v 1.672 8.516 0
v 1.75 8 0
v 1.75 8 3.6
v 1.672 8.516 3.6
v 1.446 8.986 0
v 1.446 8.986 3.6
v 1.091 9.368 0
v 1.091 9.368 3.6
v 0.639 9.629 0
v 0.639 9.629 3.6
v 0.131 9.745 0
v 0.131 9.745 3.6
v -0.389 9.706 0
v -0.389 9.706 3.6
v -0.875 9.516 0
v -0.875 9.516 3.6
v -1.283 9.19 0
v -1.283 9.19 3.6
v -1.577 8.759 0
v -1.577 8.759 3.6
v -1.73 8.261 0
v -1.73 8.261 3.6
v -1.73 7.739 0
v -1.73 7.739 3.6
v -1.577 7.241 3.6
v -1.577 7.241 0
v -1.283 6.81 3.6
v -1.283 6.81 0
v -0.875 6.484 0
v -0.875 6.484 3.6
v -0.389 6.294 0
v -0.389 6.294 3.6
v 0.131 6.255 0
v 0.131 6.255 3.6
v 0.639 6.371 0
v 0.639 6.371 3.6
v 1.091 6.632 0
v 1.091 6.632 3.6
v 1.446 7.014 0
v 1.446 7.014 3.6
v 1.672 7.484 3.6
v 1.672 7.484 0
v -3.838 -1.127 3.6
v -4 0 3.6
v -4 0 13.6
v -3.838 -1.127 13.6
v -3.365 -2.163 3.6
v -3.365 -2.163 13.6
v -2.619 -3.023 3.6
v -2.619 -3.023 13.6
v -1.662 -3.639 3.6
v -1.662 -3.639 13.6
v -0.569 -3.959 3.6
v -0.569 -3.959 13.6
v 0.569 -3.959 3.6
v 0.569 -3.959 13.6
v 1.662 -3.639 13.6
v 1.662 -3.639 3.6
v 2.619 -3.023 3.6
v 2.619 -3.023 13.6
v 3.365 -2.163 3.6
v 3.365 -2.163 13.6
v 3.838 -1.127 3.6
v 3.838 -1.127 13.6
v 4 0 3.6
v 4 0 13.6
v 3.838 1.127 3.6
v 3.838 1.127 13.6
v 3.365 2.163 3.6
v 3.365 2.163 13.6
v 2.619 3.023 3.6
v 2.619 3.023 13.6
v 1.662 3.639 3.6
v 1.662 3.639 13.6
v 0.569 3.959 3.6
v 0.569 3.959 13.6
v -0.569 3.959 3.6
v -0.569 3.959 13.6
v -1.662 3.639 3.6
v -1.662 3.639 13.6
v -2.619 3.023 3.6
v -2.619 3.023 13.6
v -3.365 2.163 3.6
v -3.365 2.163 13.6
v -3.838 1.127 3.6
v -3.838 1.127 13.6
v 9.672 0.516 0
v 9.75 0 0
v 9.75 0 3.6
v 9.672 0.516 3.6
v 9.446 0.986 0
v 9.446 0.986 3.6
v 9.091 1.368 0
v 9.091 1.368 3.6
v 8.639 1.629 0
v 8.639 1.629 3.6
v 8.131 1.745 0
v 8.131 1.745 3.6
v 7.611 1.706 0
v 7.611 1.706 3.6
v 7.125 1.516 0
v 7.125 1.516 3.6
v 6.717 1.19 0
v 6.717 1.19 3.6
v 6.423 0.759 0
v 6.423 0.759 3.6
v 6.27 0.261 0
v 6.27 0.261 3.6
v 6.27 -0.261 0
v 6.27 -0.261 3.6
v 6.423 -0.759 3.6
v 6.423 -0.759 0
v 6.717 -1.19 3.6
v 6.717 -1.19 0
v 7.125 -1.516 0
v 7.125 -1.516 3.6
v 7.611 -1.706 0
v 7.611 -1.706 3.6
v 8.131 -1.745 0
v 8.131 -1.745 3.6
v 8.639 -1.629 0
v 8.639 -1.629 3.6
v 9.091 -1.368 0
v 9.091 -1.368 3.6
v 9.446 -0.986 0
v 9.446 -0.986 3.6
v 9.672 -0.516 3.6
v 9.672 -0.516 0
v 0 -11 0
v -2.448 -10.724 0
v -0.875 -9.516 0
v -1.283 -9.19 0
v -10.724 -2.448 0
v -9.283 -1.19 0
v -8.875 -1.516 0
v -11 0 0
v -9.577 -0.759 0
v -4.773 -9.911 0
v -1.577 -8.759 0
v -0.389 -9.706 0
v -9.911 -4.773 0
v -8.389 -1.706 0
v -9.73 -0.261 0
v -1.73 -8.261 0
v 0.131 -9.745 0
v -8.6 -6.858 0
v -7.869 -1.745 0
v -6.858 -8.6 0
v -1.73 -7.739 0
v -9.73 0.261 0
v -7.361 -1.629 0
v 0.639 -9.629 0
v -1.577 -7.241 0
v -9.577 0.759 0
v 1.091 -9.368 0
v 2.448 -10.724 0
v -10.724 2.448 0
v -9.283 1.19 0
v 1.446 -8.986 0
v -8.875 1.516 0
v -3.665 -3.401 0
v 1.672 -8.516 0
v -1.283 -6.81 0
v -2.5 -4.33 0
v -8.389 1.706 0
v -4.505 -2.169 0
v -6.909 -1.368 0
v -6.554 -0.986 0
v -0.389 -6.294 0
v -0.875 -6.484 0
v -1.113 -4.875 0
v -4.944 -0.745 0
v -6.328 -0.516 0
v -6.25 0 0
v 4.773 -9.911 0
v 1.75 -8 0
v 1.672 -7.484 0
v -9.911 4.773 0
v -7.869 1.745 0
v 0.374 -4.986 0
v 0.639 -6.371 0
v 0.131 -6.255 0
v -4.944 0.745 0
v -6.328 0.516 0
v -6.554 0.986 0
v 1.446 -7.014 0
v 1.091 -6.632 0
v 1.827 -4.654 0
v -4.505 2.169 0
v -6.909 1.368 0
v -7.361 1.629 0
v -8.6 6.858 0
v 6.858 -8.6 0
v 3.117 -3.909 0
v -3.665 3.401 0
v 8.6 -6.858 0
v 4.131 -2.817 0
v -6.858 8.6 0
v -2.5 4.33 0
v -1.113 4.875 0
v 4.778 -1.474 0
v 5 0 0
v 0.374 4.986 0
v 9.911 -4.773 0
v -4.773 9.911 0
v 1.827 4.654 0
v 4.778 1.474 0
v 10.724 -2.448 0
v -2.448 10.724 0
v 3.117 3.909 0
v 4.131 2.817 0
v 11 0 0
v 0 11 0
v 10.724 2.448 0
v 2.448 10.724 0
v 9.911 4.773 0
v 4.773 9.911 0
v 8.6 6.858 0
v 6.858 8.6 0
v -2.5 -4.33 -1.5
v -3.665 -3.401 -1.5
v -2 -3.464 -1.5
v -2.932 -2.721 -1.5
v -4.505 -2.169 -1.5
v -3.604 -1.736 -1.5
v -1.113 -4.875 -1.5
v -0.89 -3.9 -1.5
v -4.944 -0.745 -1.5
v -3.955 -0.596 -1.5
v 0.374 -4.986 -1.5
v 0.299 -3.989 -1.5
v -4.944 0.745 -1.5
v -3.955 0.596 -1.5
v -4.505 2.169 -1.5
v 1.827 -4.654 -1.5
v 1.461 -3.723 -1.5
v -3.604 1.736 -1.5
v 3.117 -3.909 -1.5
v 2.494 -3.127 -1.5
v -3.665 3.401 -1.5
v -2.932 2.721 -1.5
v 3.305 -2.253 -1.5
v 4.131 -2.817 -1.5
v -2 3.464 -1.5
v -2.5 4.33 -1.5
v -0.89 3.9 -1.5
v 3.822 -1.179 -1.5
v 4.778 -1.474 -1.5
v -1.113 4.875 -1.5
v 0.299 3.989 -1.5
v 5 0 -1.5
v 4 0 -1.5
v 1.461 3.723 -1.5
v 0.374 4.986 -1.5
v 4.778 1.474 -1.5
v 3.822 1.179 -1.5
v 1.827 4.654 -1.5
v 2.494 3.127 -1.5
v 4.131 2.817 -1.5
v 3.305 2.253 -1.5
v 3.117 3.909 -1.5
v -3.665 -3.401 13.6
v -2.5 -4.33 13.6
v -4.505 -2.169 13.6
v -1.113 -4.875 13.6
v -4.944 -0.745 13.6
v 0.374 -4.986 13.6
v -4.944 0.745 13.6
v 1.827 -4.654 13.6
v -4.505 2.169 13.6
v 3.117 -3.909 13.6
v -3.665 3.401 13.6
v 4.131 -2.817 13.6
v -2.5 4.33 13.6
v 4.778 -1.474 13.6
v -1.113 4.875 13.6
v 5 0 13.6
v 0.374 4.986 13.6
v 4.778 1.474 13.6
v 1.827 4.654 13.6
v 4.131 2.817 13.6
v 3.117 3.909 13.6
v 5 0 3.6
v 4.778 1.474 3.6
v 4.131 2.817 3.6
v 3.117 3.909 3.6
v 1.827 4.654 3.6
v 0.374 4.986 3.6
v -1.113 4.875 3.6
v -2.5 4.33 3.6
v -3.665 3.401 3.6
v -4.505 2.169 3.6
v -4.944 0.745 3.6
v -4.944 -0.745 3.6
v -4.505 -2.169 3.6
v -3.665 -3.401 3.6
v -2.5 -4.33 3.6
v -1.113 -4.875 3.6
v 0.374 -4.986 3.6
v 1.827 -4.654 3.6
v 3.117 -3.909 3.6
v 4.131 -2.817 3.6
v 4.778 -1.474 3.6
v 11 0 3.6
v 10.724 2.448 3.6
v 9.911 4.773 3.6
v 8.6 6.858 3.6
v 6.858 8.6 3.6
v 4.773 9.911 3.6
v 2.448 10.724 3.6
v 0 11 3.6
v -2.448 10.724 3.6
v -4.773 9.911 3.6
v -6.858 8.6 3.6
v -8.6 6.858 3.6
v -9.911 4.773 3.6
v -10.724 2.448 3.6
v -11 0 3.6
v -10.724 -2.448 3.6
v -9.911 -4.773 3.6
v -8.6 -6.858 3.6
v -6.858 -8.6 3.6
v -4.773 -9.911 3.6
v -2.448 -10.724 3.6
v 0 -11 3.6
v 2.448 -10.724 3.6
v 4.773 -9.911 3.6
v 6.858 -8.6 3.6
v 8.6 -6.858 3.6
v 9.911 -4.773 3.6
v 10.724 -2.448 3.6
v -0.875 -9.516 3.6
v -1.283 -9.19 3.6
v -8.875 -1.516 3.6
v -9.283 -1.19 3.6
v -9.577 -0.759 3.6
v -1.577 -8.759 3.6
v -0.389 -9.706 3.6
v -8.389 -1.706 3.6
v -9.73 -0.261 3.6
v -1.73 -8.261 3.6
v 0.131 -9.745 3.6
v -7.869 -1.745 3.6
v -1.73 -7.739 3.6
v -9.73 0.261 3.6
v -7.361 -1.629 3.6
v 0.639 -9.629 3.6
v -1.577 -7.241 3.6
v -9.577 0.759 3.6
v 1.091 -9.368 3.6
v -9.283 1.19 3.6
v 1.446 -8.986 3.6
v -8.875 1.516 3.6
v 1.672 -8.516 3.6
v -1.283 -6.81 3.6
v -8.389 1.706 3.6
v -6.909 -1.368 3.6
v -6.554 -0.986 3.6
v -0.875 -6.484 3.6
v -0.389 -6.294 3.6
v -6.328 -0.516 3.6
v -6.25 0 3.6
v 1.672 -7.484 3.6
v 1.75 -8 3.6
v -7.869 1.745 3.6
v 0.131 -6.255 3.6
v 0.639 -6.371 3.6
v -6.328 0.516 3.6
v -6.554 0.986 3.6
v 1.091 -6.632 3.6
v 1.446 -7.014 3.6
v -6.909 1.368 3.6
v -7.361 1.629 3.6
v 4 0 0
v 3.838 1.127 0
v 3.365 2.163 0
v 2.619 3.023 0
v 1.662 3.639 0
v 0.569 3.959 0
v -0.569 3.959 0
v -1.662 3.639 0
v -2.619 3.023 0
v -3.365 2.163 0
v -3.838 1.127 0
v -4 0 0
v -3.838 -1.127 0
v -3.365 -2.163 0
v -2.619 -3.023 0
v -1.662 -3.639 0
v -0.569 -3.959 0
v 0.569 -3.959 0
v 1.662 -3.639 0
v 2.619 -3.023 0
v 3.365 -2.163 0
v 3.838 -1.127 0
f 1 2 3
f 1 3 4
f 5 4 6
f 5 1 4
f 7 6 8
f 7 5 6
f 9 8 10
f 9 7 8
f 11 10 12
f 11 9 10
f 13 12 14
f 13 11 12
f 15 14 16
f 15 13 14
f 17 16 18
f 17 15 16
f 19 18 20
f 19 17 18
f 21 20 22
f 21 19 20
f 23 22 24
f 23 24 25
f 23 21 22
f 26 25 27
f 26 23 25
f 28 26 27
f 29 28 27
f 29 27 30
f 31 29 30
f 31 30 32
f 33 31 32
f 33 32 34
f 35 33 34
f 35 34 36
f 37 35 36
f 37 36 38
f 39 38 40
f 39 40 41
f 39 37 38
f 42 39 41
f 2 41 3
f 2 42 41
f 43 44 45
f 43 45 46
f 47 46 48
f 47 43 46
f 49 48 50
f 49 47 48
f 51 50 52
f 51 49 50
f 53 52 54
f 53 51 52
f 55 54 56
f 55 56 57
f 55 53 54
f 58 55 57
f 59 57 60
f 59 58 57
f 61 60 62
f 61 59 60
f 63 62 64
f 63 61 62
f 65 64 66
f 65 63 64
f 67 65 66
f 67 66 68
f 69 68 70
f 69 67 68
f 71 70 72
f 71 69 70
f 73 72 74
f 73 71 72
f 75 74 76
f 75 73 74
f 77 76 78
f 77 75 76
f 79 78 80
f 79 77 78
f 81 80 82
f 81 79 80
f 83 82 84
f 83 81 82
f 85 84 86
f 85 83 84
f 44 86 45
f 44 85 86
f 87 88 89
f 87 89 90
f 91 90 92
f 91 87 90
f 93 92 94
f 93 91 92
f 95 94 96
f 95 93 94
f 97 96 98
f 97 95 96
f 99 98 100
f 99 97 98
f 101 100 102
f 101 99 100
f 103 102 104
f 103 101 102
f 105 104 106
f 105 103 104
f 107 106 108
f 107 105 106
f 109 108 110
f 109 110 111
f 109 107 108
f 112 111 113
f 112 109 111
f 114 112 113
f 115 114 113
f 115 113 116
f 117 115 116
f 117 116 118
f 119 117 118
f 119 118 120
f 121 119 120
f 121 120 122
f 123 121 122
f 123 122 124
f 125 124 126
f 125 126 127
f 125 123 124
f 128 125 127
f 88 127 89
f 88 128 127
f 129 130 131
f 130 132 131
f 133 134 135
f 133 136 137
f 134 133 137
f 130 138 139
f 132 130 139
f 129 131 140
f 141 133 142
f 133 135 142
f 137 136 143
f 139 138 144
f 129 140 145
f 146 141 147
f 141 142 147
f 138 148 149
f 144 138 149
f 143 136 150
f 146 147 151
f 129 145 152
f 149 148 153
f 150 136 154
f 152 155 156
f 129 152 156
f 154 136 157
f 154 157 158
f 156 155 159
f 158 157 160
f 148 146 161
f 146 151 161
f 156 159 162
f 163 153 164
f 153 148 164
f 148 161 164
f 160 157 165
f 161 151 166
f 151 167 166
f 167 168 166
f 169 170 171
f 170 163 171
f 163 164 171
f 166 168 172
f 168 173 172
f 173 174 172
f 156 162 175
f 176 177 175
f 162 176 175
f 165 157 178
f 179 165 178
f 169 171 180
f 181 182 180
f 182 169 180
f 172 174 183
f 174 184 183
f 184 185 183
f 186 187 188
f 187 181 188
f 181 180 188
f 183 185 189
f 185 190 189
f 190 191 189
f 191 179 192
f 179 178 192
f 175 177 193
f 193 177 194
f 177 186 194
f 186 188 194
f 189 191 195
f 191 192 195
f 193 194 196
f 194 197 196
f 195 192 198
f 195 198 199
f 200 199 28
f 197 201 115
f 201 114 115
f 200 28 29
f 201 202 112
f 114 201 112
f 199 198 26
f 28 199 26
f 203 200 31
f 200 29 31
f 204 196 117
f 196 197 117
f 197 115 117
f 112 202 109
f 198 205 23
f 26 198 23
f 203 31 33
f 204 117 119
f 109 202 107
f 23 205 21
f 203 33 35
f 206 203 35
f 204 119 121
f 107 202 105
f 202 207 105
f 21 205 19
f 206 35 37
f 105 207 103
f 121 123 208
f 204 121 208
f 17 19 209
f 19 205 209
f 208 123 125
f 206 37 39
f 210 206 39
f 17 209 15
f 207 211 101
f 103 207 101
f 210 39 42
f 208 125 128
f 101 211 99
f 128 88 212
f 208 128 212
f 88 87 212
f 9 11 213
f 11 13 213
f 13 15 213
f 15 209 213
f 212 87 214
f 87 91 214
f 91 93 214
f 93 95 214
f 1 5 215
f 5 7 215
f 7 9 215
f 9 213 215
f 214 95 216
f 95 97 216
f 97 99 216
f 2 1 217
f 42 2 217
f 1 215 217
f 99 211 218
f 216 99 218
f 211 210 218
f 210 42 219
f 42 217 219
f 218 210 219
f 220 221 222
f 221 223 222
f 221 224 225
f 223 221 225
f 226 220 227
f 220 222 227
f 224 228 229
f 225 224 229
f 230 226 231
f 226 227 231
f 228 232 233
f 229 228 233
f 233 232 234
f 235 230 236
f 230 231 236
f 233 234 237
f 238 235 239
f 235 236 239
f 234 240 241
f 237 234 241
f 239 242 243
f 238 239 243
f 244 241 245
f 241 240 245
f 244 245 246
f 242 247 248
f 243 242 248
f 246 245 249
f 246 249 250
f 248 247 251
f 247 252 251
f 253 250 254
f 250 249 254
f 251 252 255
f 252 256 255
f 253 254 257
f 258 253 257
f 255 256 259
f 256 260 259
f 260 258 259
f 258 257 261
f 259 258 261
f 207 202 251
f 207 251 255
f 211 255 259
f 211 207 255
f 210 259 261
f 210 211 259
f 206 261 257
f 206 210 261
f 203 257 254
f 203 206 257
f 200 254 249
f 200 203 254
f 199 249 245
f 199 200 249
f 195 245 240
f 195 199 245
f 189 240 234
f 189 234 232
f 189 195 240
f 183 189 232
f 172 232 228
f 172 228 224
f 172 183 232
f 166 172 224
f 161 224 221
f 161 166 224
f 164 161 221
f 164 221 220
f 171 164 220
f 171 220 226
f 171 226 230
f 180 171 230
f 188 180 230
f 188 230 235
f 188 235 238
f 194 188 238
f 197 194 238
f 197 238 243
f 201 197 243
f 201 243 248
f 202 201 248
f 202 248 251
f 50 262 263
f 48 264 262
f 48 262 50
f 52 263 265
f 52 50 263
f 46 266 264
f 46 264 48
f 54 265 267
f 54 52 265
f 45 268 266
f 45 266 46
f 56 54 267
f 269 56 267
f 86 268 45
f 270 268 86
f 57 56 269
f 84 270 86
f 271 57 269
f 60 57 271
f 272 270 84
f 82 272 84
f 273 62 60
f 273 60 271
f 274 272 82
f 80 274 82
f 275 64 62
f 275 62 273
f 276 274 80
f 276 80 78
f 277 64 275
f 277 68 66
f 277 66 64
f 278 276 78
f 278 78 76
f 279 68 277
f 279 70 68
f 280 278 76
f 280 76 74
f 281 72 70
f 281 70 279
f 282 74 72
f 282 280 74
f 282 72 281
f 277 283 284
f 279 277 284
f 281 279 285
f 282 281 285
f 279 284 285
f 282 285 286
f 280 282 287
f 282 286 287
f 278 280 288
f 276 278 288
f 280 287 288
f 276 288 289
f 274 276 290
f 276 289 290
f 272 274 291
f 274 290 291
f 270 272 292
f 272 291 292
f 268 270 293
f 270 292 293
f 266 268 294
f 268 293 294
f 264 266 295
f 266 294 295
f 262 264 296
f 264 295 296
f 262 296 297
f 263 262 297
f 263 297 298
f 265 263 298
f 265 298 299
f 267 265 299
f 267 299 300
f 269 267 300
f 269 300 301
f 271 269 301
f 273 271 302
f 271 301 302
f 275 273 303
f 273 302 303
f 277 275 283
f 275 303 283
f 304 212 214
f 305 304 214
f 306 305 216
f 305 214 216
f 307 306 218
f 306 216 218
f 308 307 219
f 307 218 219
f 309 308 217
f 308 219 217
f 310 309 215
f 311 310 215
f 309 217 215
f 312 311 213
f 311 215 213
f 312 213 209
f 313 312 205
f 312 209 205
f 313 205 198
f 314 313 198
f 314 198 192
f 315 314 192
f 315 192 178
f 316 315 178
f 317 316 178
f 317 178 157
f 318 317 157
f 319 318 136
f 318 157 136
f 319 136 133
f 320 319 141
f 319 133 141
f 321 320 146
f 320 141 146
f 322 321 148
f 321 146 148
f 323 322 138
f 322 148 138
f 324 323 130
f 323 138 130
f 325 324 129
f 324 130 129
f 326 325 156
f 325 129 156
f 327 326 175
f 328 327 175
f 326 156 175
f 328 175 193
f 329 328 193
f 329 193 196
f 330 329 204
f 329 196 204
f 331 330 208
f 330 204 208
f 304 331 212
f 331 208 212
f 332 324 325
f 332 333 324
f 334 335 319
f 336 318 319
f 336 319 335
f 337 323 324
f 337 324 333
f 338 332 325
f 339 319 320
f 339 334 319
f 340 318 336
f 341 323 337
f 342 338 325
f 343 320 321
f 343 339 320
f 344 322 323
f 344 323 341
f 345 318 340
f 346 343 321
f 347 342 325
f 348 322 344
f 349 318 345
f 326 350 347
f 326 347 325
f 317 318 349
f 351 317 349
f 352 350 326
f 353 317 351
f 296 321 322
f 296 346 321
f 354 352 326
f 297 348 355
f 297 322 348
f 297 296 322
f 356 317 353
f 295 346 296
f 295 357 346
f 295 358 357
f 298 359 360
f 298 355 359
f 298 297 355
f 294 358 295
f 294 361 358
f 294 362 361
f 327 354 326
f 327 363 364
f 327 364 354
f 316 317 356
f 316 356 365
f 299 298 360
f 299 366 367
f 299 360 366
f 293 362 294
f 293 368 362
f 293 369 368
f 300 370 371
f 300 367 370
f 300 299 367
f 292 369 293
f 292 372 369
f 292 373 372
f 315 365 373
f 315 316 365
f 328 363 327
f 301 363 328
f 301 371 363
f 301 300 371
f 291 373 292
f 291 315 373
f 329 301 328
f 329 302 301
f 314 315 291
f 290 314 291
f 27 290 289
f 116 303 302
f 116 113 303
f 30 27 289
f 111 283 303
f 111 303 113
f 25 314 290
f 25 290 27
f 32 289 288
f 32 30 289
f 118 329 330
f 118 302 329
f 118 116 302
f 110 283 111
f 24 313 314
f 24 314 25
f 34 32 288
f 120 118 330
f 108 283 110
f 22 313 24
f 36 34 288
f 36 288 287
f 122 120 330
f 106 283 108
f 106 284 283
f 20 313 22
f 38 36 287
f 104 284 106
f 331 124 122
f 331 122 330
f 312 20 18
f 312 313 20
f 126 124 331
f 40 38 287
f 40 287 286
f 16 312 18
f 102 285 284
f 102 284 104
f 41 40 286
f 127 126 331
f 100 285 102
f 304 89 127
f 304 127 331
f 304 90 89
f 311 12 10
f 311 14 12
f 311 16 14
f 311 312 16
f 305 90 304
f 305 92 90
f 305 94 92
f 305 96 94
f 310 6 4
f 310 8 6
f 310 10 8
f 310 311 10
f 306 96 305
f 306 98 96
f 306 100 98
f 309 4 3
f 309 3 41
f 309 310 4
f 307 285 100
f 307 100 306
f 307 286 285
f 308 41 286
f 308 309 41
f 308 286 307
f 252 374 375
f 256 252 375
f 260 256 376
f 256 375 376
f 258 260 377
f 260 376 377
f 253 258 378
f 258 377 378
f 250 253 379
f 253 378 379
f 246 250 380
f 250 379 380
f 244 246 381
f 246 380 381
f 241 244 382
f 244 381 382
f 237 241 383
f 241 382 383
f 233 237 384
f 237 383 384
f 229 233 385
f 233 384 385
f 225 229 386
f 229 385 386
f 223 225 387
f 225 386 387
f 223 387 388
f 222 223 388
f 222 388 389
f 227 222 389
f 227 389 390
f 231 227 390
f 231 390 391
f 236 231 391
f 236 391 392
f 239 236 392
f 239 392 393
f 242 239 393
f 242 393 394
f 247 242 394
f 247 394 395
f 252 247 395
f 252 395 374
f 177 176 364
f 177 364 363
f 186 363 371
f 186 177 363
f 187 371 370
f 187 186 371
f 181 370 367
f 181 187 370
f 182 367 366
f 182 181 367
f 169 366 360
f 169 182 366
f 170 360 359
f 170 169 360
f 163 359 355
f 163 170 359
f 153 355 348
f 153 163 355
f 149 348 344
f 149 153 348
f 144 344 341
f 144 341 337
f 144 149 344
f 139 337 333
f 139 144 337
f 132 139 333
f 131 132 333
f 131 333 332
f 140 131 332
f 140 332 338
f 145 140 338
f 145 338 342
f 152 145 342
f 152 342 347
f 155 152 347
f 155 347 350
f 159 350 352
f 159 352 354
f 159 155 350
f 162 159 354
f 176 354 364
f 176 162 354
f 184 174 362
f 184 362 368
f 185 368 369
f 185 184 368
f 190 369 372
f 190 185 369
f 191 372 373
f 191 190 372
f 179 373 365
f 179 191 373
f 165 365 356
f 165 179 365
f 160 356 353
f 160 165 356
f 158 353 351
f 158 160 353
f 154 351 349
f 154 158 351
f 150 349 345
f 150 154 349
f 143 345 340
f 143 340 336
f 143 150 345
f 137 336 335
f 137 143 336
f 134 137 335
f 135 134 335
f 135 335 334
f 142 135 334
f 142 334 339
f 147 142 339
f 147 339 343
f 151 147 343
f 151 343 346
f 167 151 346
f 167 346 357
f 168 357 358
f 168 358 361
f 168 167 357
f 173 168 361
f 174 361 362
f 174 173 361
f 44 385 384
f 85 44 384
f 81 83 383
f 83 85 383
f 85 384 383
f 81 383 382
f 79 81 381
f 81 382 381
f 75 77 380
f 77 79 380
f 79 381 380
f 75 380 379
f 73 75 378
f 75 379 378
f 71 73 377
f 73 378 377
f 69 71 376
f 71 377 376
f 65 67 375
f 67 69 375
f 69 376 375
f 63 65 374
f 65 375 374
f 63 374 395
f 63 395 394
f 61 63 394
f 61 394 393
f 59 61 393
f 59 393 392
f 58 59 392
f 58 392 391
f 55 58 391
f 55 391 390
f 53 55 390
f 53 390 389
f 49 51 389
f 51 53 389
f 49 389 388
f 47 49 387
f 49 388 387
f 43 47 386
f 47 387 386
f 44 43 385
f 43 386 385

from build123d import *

# Parameters (mm, degrees)
SKETCH_1_R             = 11
SKETCH_1_R_2           = 1.75
EXTRUDE_1_DEPTH        = 3.6
SKETCH_2_R             = 5
SKETCH_2_R_2           = 4
EXTRUDE_1_2_DEPTH      = 10
EXTRUDE_1_2_DEPTH_BACK = 5.1
SKETCH_3_R             = 4
CUT_EXTRUDE_1_DEPTH    = 14.6


with BuildPart() as part:
    # Эскиз1 → Extrude 1 (new body)
    with BuildSketch(Plane.XY):
        Circle(SKETCH_1_R)
        with Locations((0, 8)):
            Circle(SKETCH_1_R_2, mode=Mode.SUBTRACT)
        with Locations((8, 0)):
            Circle(SKETCH_1_R_2, mode=Mode.SUBTRACT)
        with Locations((0, -8)):
            Circle(SKETCH_1_R_2, mode=Mode.SUBTRACT)
        with Locations((-8, 0)):
            Circle(SKETCH_1_R_2, mode=Mode.SUBTRACT)
    extrude(amount=EXTRUDE_1_DEPTH)

    # Эскиз2 → Extrude 1 2 (add, two sides)
    with BuildSketch(Plane.XY.offset(3.6)) as extrude_1_2_sk:
        Circle(SKETCH_2_R)
        Circle(SKETCH_2_R_2, mode=Mode.SUBTRACT)
    extrude(amount=EXTRUDE_1_2_DEPTH)
    extrude(extrude_1_2_sk.sketch, amount=-EXTRUDE_1_2_DEPTH_BACK)

    # Эскиз3 → Вырез-Вытянуть1 (cut, through all)
    with BuildSketch(Plane(origin=(0, 0, 0), x_dir=(-1, 0, 0), z_dir=(0, 0, -1))):
        Circle(SKETCH_3_R)
    extrude(amount=-CUT_EXTRUDE_1_DEPTH, mode=Mode.SUBTRACT)


solid = part.part
